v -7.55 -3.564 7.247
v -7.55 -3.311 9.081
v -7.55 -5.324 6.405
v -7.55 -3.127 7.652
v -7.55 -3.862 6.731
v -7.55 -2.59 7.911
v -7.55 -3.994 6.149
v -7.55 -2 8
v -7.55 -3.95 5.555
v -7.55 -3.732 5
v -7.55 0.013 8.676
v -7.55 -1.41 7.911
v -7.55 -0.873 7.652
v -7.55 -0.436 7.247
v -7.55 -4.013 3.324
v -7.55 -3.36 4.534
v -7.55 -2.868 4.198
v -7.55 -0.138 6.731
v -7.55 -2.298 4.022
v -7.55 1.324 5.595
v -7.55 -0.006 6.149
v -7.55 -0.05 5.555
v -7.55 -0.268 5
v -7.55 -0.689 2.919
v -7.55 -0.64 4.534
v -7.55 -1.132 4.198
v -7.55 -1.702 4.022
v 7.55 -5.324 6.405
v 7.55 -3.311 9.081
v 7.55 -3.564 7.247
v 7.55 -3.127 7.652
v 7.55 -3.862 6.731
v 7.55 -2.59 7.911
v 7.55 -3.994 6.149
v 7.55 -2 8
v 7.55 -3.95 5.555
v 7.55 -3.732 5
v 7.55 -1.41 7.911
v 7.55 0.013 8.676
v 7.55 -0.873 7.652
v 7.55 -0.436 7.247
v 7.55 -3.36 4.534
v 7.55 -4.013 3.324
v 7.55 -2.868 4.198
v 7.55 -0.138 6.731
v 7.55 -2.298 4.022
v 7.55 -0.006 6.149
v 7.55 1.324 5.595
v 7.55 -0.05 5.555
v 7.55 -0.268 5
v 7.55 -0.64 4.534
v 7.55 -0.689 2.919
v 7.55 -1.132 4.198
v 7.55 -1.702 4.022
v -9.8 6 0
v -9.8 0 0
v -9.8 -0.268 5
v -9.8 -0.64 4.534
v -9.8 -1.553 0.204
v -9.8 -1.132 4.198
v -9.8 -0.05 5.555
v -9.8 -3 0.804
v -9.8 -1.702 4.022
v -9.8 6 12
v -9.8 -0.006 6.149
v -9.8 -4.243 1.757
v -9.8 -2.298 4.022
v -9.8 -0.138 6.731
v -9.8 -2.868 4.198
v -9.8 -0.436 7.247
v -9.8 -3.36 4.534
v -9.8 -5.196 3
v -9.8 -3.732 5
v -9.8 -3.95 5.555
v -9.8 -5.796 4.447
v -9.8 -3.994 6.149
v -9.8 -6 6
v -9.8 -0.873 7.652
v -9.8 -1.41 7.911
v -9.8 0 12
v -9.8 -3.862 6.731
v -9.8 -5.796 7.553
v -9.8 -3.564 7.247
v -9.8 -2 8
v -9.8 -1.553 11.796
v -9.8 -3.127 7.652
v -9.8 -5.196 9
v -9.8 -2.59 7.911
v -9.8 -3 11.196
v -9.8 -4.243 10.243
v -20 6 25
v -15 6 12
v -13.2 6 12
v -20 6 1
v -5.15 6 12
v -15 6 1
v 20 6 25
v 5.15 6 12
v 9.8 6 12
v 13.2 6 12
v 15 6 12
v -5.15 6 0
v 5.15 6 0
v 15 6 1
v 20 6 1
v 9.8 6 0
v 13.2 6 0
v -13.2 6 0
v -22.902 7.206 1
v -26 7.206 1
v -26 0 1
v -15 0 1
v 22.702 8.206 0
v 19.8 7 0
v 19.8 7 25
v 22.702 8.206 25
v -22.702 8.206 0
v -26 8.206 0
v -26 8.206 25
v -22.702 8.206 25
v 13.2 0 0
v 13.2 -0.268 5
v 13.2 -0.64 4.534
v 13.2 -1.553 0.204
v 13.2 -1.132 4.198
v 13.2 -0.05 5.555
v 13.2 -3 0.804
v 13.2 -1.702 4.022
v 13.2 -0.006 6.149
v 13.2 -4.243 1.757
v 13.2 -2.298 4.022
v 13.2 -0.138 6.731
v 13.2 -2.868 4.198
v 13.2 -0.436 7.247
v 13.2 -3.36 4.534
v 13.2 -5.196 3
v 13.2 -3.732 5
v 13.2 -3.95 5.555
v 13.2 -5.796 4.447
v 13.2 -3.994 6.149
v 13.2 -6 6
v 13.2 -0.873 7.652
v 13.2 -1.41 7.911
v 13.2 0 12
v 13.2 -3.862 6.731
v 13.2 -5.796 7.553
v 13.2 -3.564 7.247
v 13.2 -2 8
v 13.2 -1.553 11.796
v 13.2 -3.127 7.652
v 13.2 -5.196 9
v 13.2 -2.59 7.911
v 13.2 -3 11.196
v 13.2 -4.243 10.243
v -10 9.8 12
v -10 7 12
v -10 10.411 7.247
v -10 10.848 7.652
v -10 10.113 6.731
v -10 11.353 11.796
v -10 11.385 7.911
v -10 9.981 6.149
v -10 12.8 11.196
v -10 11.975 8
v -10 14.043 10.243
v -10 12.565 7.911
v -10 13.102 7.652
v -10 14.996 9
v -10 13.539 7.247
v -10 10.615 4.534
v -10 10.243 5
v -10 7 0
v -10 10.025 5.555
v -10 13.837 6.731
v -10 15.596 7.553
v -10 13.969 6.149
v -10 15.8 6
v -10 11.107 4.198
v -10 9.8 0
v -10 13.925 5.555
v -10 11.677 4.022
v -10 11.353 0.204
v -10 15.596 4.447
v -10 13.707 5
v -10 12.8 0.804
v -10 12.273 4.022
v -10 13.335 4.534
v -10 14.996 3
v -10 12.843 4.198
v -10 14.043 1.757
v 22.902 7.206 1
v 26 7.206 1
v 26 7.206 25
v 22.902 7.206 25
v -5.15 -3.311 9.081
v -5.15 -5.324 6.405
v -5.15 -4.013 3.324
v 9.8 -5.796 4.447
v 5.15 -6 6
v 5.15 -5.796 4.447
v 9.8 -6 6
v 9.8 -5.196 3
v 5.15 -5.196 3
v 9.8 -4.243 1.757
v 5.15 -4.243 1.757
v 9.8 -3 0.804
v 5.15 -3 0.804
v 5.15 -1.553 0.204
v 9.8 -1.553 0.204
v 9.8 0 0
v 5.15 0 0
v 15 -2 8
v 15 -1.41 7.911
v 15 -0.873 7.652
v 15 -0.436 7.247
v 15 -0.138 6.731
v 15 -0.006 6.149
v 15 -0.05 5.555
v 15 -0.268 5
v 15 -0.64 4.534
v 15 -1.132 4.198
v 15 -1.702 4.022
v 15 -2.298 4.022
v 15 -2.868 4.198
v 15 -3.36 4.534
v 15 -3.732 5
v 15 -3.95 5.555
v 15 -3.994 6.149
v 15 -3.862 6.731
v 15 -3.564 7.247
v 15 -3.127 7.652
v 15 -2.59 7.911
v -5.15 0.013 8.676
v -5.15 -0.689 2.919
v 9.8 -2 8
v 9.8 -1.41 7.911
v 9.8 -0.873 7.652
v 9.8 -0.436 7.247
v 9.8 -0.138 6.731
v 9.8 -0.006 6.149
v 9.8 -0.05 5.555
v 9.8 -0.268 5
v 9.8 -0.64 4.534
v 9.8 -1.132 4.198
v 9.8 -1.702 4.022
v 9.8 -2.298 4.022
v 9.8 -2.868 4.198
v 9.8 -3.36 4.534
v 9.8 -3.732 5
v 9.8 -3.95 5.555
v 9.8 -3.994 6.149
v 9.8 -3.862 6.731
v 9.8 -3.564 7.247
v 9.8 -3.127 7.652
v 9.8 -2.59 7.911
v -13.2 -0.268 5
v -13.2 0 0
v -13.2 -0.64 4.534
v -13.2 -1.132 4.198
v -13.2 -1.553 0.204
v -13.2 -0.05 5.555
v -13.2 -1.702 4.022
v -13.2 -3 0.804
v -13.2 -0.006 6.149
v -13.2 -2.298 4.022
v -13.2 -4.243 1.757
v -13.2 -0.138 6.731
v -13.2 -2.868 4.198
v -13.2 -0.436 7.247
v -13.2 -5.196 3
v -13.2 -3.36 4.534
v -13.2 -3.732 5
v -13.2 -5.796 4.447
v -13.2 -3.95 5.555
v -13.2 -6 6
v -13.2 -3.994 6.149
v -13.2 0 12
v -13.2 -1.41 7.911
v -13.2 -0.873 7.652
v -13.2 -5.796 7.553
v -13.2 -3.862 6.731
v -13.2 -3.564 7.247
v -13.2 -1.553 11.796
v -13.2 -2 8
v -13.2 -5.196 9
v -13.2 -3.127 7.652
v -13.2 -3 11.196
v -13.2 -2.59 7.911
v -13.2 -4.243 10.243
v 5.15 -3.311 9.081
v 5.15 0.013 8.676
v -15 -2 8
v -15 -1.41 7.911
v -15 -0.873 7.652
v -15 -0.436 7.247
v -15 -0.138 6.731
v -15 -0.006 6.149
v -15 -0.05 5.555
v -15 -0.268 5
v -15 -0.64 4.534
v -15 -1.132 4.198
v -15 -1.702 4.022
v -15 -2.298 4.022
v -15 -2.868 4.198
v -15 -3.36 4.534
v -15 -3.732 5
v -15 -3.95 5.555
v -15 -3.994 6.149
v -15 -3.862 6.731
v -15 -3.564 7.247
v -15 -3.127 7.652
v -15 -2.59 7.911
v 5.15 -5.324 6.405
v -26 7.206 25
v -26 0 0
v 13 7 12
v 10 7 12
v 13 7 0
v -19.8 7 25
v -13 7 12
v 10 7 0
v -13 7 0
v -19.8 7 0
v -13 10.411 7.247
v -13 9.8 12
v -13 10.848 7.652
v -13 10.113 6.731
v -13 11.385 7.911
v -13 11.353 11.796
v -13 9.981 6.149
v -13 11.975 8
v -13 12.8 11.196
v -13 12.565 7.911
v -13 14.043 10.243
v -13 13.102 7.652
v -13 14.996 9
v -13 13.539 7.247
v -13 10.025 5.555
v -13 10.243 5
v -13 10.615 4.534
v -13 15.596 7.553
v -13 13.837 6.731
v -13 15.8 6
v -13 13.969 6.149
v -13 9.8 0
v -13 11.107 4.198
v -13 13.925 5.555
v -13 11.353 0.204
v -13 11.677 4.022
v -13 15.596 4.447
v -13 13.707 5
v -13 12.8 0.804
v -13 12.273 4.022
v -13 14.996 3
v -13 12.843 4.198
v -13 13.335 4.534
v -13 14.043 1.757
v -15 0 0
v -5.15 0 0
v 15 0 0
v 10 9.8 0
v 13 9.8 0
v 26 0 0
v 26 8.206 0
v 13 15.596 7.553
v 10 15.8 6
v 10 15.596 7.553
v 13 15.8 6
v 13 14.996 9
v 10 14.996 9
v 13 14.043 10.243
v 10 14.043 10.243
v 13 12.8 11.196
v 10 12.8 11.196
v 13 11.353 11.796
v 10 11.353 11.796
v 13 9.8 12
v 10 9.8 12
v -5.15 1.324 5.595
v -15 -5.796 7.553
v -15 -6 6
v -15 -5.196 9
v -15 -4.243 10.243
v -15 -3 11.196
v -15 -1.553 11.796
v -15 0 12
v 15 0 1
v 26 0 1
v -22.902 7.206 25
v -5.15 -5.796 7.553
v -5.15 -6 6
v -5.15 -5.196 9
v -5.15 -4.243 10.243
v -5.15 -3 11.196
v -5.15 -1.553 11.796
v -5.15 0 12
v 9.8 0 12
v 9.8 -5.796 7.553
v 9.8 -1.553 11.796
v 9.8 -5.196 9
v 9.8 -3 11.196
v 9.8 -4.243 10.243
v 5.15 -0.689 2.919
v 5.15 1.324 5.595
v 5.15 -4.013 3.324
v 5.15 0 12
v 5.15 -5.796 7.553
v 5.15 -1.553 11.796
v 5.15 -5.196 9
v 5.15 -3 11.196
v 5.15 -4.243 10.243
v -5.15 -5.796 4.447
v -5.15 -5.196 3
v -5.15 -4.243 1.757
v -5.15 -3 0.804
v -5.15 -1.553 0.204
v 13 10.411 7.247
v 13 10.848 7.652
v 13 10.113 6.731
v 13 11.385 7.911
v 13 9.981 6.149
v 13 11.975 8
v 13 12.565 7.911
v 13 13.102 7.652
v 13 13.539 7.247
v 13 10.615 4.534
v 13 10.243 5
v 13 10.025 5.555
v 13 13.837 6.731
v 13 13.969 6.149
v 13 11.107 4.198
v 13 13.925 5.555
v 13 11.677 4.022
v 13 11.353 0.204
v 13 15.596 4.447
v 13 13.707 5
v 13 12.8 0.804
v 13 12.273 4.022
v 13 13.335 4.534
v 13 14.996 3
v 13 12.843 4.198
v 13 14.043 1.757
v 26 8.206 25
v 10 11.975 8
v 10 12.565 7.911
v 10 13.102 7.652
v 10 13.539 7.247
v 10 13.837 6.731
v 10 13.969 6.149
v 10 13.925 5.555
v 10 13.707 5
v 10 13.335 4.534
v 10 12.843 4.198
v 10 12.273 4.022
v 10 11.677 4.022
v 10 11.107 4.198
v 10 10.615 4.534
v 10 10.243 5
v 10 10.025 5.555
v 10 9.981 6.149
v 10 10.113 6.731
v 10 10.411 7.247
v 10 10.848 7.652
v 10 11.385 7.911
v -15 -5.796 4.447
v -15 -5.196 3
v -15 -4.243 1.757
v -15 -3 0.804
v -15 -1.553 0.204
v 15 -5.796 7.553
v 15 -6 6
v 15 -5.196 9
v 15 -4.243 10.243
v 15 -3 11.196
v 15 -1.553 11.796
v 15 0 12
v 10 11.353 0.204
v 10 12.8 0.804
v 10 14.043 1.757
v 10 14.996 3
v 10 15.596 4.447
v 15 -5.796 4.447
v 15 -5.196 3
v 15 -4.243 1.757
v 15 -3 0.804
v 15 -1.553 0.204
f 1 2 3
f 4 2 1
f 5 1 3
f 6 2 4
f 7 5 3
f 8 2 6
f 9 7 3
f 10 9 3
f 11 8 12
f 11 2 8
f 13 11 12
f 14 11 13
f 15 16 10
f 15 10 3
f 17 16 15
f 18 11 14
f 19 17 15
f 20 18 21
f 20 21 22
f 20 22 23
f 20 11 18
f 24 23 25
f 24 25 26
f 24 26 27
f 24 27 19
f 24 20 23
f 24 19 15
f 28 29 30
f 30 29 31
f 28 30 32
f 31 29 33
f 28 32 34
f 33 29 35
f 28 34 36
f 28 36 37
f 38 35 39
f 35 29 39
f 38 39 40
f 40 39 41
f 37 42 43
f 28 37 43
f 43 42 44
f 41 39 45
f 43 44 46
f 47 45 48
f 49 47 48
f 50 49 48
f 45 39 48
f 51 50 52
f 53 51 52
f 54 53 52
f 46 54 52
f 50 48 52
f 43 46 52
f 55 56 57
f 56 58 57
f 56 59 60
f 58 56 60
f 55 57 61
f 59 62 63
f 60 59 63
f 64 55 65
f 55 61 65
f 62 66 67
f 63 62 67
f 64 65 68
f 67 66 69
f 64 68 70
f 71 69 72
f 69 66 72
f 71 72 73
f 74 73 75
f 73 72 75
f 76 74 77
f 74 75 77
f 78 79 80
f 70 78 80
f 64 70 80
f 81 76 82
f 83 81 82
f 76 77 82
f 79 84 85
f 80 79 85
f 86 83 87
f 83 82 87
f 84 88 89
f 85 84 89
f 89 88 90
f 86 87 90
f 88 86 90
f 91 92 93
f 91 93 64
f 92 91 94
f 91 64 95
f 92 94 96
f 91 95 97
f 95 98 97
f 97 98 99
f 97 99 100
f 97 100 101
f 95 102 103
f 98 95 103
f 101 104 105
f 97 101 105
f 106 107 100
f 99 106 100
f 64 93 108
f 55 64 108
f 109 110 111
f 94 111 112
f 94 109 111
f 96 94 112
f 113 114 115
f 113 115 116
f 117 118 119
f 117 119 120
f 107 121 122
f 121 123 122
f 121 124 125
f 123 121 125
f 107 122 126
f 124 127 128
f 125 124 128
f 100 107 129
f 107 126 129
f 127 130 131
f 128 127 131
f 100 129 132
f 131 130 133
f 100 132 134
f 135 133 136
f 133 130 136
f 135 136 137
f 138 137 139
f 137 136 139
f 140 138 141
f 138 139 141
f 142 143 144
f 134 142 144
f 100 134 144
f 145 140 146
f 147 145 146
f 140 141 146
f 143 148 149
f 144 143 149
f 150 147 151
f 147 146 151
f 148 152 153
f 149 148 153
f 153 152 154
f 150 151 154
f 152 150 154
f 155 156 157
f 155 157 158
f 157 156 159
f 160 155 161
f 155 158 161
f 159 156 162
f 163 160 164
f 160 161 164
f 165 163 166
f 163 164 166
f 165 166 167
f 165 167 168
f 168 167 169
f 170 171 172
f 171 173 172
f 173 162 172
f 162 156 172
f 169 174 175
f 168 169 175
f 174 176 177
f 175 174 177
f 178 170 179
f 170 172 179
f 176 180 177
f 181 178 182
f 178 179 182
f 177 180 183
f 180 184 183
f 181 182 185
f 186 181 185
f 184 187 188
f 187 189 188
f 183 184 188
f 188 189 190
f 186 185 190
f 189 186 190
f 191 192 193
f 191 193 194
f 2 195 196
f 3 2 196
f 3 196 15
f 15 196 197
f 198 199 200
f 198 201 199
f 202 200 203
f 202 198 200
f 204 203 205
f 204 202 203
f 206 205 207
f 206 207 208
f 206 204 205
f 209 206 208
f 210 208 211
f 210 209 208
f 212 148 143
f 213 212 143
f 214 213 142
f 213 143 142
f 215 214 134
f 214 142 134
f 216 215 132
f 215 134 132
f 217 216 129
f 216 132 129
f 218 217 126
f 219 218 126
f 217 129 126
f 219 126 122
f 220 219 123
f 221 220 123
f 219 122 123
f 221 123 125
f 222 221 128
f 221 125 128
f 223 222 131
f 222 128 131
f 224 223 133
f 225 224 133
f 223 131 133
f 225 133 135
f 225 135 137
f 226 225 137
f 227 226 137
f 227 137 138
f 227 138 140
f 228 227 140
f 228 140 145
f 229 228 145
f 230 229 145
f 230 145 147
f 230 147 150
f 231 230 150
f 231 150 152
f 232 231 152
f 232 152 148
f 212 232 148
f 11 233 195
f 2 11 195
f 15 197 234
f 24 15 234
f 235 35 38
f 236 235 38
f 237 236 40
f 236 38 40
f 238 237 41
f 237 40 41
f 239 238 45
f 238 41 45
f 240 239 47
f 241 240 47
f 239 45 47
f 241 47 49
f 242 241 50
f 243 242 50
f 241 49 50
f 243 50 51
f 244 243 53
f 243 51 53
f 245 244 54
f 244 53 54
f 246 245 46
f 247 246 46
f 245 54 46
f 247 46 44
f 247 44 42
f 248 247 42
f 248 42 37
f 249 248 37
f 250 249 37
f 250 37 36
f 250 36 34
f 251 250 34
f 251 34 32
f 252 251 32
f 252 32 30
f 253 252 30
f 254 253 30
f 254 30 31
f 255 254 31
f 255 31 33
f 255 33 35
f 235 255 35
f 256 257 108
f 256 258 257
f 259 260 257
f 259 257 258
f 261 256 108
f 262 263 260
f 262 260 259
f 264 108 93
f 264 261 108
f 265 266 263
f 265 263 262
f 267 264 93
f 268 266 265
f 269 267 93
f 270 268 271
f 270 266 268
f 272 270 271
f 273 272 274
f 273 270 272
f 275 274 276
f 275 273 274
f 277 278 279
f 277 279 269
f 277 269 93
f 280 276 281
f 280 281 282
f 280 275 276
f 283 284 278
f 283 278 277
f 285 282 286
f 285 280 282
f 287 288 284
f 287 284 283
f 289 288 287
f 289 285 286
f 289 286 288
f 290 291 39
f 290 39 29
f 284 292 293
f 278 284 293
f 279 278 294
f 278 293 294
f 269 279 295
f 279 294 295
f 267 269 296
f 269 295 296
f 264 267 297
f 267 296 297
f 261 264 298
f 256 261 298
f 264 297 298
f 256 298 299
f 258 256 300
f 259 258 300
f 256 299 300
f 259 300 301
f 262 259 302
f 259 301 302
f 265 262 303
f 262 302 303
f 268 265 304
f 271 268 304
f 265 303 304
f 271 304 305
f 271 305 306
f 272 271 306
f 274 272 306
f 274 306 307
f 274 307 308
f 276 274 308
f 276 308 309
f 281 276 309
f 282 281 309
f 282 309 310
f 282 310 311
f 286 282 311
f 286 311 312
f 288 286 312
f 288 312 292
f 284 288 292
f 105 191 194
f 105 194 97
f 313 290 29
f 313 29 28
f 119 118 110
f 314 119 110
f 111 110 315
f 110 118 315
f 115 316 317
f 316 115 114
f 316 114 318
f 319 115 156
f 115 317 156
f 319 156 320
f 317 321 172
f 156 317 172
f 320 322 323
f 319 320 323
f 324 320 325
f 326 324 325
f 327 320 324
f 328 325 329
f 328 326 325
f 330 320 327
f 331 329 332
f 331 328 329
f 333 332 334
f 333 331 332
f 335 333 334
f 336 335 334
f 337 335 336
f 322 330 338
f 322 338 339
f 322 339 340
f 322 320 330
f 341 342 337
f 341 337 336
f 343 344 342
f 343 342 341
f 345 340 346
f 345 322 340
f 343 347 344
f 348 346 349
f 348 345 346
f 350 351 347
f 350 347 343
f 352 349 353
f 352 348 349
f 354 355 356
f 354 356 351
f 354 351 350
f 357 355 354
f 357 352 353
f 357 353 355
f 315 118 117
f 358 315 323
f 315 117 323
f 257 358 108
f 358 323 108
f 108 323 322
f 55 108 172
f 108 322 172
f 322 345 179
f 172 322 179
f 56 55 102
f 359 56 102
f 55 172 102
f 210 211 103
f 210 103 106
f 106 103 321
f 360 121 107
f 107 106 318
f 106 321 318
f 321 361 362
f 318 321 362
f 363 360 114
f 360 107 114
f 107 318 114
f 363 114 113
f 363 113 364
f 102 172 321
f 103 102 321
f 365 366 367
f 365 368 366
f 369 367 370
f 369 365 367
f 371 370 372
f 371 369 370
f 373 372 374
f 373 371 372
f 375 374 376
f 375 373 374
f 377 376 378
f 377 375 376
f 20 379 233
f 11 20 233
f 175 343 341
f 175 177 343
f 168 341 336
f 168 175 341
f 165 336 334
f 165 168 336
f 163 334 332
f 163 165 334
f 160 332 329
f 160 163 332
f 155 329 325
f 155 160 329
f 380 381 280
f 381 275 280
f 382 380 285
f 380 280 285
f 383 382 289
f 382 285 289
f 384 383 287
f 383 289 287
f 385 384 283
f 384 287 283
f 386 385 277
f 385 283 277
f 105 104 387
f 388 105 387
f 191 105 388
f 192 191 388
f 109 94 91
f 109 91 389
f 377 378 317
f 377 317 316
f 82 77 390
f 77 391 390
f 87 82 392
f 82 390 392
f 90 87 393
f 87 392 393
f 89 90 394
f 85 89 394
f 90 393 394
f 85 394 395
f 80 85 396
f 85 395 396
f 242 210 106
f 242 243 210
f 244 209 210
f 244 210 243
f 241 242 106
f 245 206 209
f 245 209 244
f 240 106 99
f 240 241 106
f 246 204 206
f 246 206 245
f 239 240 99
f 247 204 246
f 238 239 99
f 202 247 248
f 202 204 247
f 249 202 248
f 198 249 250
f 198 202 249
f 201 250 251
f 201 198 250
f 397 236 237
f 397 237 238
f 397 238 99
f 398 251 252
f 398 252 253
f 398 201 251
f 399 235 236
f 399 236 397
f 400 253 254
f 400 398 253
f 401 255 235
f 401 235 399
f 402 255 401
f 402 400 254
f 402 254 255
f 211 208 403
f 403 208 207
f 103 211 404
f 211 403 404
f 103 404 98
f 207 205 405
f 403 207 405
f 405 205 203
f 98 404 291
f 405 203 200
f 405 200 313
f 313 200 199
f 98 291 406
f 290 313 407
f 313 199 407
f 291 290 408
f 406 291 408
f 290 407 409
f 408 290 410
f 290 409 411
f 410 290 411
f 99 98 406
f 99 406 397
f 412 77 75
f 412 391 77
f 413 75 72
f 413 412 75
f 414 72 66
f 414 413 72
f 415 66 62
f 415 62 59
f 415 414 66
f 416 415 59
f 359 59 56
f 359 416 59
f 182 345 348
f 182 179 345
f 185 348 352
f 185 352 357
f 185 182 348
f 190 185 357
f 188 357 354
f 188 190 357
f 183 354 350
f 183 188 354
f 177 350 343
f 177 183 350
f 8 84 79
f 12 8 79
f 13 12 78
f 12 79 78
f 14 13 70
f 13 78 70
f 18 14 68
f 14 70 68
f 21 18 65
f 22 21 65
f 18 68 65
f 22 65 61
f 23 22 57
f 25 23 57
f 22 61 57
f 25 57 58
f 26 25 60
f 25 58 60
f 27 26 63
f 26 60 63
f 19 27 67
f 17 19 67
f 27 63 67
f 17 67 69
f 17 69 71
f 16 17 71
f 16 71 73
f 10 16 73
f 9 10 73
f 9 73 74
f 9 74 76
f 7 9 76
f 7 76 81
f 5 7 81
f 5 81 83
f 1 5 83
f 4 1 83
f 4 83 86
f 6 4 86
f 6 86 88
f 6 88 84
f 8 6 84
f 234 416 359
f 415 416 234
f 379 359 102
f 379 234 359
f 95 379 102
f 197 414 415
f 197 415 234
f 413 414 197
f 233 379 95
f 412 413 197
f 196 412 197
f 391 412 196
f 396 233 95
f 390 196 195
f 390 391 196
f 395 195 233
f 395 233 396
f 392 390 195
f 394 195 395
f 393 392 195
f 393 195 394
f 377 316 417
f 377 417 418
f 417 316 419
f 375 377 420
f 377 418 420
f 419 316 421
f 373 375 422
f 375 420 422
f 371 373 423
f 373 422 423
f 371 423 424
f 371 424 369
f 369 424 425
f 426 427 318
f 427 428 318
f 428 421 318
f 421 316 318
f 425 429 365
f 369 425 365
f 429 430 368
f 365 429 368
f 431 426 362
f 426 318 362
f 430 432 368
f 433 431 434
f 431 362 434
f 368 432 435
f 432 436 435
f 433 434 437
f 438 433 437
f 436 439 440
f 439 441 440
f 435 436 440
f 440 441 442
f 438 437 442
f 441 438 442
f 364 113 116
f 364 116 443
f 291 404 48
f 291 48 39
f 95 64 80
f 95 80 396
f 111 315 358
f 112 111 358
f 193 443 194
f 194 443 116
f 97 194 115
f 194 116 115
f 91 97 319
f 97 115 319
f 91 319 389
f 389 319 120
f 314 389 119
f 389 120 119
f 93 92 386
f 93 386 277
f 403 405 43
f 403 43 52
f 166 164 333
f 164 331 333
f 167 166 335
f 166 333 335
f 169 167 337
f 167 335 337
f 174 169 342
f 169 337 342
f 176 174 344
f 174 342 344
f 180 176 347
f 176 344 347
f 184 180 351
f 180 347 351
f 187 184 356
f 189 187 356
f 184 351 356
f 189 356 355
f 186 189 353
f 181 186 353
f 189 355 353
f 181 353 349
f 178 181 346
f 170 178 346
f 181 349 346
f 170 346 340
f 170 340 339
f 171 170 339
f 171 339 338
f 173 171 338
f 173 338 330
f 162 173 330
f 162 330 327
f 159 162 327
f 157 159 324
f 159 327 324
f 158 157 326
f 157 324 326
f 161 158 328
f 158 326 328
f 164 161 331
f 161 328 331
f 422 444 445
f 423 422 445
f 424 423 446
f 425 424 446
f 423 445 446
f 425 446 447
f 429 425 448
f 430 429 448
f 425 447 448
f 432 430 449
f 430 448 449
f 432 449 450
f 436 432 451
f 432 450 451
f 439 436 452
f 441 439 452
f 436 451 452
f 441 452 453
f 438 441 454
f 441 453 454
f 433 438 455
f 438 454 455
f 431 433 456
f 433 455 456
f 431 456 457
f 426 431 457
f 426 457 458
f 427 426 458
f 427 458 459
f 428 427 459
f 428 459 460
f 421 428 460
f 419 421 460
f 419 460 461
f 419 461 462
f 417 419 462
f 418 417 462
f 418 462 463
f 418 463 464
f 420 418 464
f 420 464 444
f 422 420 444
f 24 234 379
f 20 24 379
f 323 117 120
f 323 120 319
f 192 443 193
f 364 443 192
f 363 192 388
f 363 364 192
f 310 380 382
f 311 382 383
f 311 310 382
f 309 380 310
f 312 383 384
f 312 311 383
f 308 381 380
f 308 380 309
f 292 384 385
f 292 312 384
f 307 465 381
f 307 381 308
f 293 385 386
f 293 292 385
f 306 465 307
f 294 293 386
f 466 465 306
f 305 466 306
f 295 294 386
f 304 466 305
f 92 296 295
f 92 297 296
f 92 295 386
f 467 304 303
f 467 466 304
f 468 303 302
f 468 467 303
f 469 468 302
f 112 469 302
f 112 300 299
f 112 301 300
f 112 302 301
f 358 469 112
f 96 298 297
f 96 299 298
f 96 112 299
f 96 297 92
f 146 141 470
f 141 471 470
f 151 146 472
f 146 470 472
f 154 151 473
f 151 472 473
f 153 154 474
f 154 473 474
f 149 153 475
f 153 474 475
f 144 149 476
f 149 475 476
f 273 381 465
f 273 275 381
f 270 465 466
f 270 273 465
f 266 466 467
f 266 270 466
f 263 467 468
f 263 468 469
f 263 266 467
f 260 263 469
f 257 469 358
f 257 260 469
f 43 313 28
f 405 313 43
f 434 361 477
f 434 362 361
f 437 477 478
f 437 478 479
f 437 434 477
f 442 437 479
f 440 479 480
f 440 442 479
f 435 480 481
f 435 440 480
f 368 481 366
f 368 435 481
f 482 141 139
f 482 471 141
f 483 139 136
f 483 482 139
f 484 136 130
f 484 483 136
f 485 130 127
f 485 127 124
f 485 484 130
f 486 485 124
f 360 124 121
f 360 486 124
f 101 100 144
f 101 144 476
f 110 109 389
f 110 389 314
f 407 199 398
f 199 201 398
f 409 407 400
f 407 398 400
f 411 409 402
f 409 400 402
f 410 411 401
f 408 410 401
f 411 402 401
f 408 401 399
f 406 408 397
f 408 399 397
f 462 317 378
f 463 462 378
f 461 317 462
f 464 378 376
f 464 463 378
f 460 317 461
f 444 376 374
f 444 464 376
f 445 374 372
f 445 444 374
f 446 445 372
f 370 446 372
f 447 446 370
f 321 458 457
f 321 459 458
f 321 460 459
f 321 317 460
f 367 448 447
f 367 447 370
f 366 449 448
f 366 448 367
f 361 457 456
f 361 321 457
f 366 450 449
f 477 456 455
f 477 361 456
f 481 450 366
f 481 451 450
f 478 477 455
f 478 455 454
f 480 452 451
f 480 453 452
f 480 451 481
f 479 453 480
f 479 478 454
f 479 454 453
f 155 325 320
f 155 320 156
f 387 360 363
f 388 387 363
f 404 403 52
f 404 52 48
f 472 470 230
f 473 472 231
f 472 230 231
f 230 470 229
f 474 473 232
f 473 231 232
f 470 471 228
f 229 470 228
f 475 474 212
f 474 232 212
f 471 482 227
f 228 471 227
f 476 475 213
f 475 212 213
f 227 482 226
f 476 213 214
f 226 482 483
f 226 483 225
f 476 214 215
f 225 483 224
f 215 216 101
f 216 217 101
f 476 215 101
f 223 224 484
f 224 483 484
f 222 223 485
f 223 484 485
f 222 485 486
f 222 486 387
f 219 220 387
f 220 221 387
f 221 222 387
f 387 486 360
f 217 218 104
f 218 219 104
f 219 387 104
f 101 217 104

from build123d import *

# Parameters (mm, degrees)
SKETCH2_W                 = 5
SKETCH2_H                 = 12
BOSS_EXTRUDE1_DEPTH       = 12
BOSS_EXTRUDE1_2_DEPTH     = 12
BOSS_EXTRUDE3_DEPTH       = 25
SKETCH5_W                 = 3
SKETCH5_H                 = 8.8
BOSS_EXTRUDE4_DEPTH       = 12
SKETCH7_W                 = 2
SKETCH7_H                 = 12
BOSS_EXTRUDE5_DEPTH       = 12
SKETCH15_W                = 0.2
SKETCH15_H                = 12
CUT_EXTRUDE2_DEPTH        = 12
SKETCH16_W                = 0.15
SKETCH16_H                = 12
CUT_EXTRUDE3_DEPTH        = 12
FILLET1_R                 = 6
F_4_0MM_DOWEL_HOLE2_D     = 4
FILLET2_R                 = 6
F_4_0MM_DOWEL_HOLE1_D     = 4
F_4_0MM_DOWEL_HOLE1_DEPTH = 26
F_4_0MM_DOWEL_HOLE1_TIP   = 1.201721238
BOSS_EXTRUDE6_DEPTH       = 1
CUT_EXTRUDE4_DEPTH        = 2.4


with BuildPart() as part:
    # Sketch2 → Boss-Extrude1 (new body)
    with BuildSketch(Plane.XY):
        with Locations((-7.5, 0)):
            Rectangle(SKETCH2_W, SKETCH2_H)
    extrude(amount=BOSS_EXTRUDE1_DEPTH)



with BuildPart() as body_2:
    # Sketch2 → Boss-Extrude1 2 (new body)
    with BuildSketch(Plane.XY):
        with Locations((7.5, 0)):
            Rectangle(SKETCH2_W, SKETCH2_H)
    extrude(amount=BOSS_EXTRUDE1_2_DEPTH)


with BuildPart() as part_1:
    add(part.part)

    add(body_2.part)  # Boss-Extrude3 merges body 2
    # Sketch4 → Boss-Extrude3 (add)
    with BuildSketch(Plane.XY):
        Polygon((-10, 6), (-20, 6), (-22.901603942, 7.206366686), (-26, 7.206366686), (-26, 8.206366686), (-22.7020064, 8.206366686), (-19.800402458, 7), (-10, 7), (10, 7), (19.800402458, 7), (22.7020064, 8.206366686), (26, 8.206366686), (26, 7.206366686), (22.901603942, 7.206366686), (20, 6), (10, 6), align=None)
    extrude(amount=BOSS_EXTRUDE3_DEPTH)

    # Sketch5 → Boss-Extrude4 (add)
    with BuildSketch(Plane.XY):
        with Locations((-11.5, 11.4)):
            Rectangle(SKETCH5_W, SKETCH5_H)
        with Locations((11.5, 11.4)):
            Rectangle(SKETCH5_W, SKETCH5_H)
    extrude(amount=BOSS_EXTRUDE4_DEPTH)

    # Sketch7 → Boss-Extrude5 (add)
    with BuildSketch(Plane.XY):
        with Locations((-14, 0)):
            Rectangle(SKETCH7_W, SKETCH7_H)
        with Locations((14, 0)):
            Rectangle(SKETCH7_W, SKETCH7_H)
    extrude(amount=BOSS_EXTRUDE5_DEPTH)

    # Sketch15 → Cut-Extrude2 (cut)
    with BuildSketch(Plane.XZ.offset(6)):
        with Locations((-9.9, 6)):
            Rectangle(SKETCH15_W, SKETCH15_H)
        with Locations((9.9, 6)):
            Rectangle(SKETCH15_W, SKETCH15_H)
        with Locations((-13.1, 6)):
            Rectangle(SKETCH15_W, SKETCH15_H)
        with Locations((13.1, 6)):
            Rectangle(SKETCH15_W, SKETCH15_H)
    extrude(amount=-CUT_EXTRUDE2_DEPTH, mode=Mode.SUBTRACT)

    # Sketch16 → Cut-Extrude3 (cut)
    with BuildSketch(Plane.XZ.offset(6)):
        with Locations((-5.075, 6)):
            Rectangle(SKETCH16_W, SKETCH16_H)
        with Locations((5.075, 6)):
            Rectangle(SKETCH16_W, SKETCH16_H)
    extrude(amount=-CUT_EXTRUDE3_DEPTH, mode=Mode.SUBTRACT)

    # Fillet1
    fillet1_edges = [part_1.edges().sort_by_distance(p)[0] for p in [
        (7.475, -6, 0),
        (7.475, -6, 12),
        (-7.475, -6, 0),
        (-7.475, -6, 12),
        (-14.1, -6, 0),
        (-14.1, -6, 12),
        (14.1, -6, 12),
        (14.1, -6, 0),
    ]]
    fillet(fillet1_edges, radius=FILLET1_R - 0.0001)  # a hair under: the kernel refuses the full size

    # Ø4.0mm Dowel Hole2 (through all)
    with Locations(Plane(origin=(15, 0, 0), x_dir=(0, 0, -1), z_dir=(1, 0, 0))):
        with Locations((-6, -2)):
            Hole(F_4_0MM_DOWEL_HOLE2_D / 2)

    # Fillet2
    fillet2_edges = [part_1.edges().sort_by_distance(p)[0] for p in [
        (-11.5, 15.8, 0),
        (-11.5, 15.8, 12),
        (11.5, 15.8, 0),
        (11.5, 15.8, 12),
    ]]
    fillet(fillet2_edges, radius=FILLET2_R - 0.0001)  # a hair under: the kernel refuses the full size

    # Ø4.0mm Dowel Hole1
    with Locations(Plane(origin=(13, 0, 0), x_dir=(0, 0, -1), z_dir=(1, 0, 0))):
        with Locations((-6, 11.975)):
            Hole(F_4_0MM_DOWEL_HOLE1_D / 2, depth=F_4_0MM_DOWEL_HOLE1_DEPTH)
            with Locations((0, 0, -(F_4_0MM_DOWEL_HOLE1_DEPTH + F_4_0MM_DOWEL_HOLE1_TIP / 2))):  # 118° drill point
                Cone(0, F_4_0MM_DOWEL_HOLE1_D / 2, F_4_0MM_DOWEL_HOLE1_TIP, mode=Mode.SUBTRACT)

    # Sketch14 → Boss-Extrude6 (add)
    with BuildSketch(Plane.XY):
        Polygon((-22.901603942, 7.206366686), (-26, 7.206366686), (-26, 0), (-15, 0), (-15, 6), (-20, 6), align=None)
        Polygon((20, 6), (15, 6), (15, 0), (26, 0), (26, 7.206366686), (22.901603942, 7.206366686), align=None)
    extrude(amount=BOSS_EXTRUDE6_DEPTH)

    # Sketch18 → Cut-Extrude4 (cut)
    with BuildSketch(Plane(origin=(-5.15, 0, 0), x_dir=(0, 0, -1), z_dir=(1, 0, 0))):
        Polygon((-2.918757855, -0.688786755), (-5.594922908, 1.324040596), (-8.676165053, 0.01282735), (-9.081242145, -3.311213245), (-6.405077092, -5.324040596), (-3.323834947, -4.01282735), align=None)
    cut_extrude4 = extrude(amount=-CUT_EXTRUDE4_DEPTH, mode=Mode.SUBTRACT)

    # Mirror1: Cut-Extrude4 across plane
    add(cut_extrude4.mirror(Plane(origin=(0, 0, 0), x_dir=(0, 0, 1), z_dir=(1, 0, 0))), mode=Mode.SUBTRACT)


solid = part_1.part
